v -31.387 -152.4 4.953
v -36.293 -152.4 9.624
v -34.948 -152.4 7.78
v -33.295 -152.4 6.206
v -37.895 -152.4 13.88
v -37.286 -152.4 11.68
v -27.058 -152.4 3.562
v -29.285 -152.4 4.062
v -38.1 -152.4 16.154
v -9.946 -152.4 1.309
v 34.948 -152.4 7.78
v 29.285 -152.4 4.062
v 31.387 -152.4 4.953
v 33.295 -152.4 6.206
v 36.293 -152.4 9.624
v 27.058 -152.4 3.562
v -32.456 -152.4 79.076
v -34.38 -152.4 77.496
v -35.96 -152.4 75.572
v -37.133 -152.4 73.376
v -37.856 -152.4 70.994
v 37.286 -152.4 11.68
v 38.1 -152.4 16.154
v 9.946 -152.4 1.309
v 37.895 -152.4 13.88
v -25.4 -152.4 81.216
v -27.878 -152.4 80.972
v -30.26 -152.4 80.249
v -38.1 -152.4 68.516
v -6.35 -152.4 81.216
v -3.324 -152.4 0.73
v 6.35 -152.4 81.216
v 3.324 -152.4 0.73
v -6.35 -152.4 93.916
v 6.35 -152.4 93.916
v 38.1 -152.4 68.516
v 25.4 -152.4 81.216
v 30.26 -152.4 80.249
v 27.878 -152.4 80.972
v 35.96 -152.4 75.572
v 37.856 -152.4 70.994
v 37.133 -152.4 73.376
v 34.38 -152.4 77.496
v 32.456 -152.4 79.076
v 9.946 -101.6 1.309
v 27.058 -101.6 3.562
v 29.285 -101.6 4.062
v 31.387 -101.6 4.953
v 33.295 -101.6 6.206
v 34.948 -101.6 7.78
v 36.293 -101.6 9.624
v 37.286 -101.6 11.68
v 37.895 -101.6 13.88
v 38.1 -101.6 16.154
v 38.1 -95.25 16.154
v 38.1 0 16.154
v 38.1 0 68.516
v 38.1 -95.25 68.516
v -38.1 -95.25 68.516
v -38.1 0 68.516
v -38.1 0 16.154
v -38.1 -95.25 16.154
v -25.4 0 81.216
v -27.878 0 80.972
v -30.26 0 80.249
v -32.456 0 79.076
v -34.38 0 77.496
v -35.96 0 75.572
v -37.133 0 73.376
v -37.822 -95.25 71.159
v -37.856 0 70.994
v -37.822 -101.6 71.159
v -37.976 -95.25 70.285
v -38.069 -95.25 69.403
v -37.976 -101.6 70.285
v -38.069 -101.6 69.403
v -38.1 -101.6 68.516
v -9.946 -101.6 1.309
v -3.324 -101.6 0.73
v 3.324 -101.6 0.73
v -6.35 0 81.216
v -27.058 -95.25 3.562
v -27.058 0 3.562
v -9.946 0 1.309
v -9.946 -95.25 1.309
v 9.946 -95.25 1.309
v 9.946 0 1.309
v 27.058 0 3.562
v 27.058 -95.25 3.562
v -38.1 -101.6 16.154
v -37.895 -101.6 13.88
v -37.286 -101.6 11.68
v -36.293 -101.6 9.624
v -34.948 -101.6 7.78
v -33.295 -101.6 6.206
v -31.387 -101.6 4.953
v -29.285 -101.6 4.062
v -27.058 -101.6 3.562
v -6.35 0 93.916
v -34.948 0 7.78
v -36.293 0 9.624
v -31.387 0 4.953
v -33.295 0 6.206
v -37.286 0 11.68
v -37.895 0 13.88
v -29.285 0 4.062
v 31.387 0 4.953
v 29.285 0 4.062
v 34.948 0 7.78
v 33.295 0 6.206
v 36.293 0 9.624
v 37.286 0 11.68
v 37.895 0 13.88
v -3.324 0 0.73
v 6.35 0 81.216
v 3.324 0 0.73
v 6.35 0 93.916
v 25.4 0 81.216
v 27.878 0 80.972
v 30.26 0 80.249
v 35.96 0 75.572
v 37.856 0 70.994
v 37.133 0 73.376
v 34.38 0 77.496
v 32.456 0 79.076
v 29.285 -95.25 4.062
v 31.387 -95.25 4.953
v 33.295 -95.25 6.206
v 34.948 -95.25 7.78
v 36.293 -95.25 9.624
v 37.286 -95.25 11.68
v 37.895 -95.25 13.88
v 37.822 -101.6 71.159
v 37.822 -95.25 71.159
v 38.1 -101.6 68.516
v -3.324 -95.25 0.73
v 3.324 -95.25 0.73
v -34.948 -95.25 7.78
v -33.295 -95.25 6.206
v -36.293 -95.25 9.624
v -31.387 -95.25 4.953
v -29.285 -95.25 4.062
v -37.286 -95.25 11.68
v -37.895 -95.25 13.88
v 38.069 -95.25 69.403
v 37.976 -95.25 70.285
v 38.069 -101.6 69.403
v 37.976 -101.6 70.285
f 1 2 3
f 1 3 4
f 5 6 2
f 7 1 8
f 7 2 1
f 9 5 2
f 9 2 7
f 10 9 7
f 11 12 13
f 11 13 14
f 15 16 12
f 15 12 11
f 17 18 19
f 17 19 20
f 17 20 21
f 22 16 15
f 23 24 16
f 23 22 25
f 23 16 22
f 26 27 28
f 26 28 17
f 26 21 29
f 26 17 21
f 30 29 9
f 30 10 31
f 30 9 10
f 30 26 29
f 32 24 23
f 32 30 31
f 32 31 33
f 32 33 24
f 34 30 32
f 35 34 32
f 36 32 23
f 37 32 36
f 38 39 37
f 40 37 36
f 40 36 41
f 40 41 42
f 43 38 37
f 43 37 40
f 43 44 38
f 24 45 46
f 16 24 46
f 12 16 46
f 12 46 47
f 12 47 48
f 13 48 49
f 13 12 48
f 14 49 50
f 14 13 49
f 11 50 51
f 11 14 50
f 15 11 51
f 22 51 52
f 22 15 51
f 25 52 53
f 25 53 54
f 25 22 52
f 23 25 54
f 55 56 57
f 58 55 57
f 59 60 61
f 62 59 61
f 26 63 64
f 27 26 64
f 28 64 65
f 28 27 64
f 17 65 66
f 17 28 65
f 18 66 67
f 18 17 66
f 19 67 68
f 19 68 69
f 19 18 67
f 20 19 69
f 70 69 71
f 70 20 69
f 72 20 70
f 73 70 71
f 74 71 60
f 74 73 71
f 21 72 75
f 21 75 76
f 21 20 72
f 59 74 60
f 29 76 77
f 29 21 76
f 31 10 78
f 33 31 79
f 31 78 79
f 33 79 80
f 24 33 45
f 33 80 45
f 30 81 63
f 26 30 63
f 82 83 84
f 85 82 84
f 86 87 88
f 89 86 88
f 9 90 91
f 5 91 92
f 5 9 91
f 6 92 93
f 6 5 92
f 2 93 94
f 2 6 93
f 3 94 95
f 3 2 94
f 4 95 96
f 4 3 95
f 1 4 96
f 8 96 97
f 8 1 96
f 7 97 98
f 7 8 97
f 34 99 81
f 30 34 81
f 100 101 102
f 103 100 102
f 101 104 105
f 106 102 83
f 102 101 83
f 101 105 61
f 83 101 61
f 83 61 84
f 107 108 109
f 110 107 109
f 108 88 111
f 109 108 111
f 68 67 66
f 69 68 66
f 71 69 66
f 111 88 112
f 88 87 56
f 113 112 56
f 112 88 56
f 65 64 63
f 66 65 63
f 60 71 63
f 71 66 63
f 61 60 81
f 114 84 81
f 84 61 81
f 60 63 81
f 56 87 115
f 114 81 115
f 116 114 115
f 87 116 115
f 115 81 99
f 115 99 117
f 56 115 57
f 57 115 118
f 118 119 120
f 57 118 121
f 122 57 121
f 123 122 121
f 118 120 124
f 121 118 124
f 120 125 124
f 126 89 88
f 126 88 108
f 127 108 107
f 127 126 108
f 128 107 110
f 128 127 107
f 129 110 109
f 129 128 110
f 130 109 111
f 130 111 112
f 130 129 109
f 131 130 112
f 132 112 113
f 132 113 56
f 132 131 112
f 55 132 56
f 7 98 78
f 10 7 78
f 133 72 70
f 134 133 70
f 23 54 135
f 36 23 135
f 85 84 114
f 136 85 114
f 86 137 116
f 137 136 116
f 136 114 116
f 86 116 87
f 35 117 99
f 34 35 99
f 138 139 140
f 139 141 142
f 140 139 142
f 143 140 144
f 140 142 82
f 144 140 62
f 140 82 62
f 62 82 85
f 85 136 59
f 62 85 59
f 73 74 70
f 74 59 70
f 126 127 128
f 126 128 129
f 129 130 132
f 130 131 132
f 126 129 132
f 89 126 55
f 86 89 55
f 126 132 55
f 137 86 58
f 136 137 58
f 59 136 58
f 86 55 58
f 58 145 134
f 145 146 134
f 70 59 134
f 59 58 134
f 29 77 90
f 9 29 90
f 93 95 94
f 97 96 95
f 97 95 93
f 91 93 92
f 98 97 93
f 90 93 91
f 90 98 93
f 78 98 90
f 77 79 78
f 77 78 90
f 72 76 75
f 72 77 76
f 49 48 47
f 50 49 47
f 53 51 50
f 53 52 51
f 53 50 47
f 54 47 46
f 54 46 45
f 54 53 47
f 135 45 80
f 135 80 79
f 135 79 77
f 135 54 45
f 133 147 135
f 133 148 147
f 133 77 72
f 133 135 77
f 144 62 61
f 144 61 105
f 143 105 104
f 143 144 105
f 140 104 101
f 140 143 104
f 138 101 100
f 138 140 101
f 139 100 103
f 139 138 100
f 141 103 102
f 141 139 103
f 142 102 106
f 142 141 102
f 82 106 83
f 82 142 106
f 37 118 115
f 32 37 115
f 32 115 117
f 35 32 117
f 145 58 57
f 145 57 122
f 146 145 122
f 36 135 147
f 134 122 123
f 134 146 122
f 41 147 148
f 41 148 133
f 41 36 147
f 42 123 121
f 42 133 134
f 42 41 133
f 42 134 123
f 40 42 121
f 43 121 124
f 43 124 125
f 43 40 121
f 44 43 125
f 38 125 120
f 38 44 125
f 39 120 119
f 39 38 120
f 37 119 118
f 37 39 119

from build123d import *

# Parameters (mm, degrees)
F1_DEPTH      = 152.4
F2_R          = 12.7
F3_W          = 6.35
F3_H          = 76.2
F4_DEPTH      = 38.101
F4_DEPTH_BACK = 38.101


with BuildPart() as f1:
    # F0 (on Front) → F1 (new body)
    with BuildSketch(Plane.XZ):
        with BuildLine():
            Line((-6.35, 93.9159601581), (-6.35, 81.2159601581))
            Line((-6.35, 81.2159601581), (-38.1, 81.2159601581))
            Line((-38.1, 81.2159601581), (-38.1, 5.0159601581))
            Line((-38.1, 5.0159601581), (-9.9460958472, 1.3094283595))
            ThreePointArc((-9.9460958472, 1.3094283595), (0, 0.6575267962), (9.9460958472, 1.3094283595))
            Line((9.9460958472, 1.3094283595), (38.1, 5.0159601581))
            Line((38.1, 5.0159601581), (38.1, 81.2159601581))
            Line((38.1, 81.2159601581), (6.35, 81.2159601581))
            Line((6.35, 81.2159601581), (6.35, 93.9159601581))
            Line((6.35, 93.9159601581), (-6.35, 93.9159601581))
        make_face()
    extrude(amount=F1_DEPTH)

    # F2
    f2_edges = [f1.edges().sort_by_distance(p)[0] for p in [
        (38.1, -76.2, 81.21596),
        (-38.1, -76.2, 81.21596),
        (-38.1, -76.2, 5.01596),
        (38.1, -76.2, 5.01596),
    ]]
    fillet(f2_edges, radius=F2_R)

    # F3 (on Right) → F4 (cut, two sides)
    with BuildSketch(Plane.YZ) as f4_sk:
        with Locations((-98.425, 33.0594283595)):
            Rectangle(F3_W, F3_H)
    extrude(amount=-F4_DEPTH, mode=Mode.SUBTRACT)
    extrude(f4_sk.sketch, amount=F4_DEPTH_BACK, mode=Mode.SUBTRACT)


solid = f1.part
